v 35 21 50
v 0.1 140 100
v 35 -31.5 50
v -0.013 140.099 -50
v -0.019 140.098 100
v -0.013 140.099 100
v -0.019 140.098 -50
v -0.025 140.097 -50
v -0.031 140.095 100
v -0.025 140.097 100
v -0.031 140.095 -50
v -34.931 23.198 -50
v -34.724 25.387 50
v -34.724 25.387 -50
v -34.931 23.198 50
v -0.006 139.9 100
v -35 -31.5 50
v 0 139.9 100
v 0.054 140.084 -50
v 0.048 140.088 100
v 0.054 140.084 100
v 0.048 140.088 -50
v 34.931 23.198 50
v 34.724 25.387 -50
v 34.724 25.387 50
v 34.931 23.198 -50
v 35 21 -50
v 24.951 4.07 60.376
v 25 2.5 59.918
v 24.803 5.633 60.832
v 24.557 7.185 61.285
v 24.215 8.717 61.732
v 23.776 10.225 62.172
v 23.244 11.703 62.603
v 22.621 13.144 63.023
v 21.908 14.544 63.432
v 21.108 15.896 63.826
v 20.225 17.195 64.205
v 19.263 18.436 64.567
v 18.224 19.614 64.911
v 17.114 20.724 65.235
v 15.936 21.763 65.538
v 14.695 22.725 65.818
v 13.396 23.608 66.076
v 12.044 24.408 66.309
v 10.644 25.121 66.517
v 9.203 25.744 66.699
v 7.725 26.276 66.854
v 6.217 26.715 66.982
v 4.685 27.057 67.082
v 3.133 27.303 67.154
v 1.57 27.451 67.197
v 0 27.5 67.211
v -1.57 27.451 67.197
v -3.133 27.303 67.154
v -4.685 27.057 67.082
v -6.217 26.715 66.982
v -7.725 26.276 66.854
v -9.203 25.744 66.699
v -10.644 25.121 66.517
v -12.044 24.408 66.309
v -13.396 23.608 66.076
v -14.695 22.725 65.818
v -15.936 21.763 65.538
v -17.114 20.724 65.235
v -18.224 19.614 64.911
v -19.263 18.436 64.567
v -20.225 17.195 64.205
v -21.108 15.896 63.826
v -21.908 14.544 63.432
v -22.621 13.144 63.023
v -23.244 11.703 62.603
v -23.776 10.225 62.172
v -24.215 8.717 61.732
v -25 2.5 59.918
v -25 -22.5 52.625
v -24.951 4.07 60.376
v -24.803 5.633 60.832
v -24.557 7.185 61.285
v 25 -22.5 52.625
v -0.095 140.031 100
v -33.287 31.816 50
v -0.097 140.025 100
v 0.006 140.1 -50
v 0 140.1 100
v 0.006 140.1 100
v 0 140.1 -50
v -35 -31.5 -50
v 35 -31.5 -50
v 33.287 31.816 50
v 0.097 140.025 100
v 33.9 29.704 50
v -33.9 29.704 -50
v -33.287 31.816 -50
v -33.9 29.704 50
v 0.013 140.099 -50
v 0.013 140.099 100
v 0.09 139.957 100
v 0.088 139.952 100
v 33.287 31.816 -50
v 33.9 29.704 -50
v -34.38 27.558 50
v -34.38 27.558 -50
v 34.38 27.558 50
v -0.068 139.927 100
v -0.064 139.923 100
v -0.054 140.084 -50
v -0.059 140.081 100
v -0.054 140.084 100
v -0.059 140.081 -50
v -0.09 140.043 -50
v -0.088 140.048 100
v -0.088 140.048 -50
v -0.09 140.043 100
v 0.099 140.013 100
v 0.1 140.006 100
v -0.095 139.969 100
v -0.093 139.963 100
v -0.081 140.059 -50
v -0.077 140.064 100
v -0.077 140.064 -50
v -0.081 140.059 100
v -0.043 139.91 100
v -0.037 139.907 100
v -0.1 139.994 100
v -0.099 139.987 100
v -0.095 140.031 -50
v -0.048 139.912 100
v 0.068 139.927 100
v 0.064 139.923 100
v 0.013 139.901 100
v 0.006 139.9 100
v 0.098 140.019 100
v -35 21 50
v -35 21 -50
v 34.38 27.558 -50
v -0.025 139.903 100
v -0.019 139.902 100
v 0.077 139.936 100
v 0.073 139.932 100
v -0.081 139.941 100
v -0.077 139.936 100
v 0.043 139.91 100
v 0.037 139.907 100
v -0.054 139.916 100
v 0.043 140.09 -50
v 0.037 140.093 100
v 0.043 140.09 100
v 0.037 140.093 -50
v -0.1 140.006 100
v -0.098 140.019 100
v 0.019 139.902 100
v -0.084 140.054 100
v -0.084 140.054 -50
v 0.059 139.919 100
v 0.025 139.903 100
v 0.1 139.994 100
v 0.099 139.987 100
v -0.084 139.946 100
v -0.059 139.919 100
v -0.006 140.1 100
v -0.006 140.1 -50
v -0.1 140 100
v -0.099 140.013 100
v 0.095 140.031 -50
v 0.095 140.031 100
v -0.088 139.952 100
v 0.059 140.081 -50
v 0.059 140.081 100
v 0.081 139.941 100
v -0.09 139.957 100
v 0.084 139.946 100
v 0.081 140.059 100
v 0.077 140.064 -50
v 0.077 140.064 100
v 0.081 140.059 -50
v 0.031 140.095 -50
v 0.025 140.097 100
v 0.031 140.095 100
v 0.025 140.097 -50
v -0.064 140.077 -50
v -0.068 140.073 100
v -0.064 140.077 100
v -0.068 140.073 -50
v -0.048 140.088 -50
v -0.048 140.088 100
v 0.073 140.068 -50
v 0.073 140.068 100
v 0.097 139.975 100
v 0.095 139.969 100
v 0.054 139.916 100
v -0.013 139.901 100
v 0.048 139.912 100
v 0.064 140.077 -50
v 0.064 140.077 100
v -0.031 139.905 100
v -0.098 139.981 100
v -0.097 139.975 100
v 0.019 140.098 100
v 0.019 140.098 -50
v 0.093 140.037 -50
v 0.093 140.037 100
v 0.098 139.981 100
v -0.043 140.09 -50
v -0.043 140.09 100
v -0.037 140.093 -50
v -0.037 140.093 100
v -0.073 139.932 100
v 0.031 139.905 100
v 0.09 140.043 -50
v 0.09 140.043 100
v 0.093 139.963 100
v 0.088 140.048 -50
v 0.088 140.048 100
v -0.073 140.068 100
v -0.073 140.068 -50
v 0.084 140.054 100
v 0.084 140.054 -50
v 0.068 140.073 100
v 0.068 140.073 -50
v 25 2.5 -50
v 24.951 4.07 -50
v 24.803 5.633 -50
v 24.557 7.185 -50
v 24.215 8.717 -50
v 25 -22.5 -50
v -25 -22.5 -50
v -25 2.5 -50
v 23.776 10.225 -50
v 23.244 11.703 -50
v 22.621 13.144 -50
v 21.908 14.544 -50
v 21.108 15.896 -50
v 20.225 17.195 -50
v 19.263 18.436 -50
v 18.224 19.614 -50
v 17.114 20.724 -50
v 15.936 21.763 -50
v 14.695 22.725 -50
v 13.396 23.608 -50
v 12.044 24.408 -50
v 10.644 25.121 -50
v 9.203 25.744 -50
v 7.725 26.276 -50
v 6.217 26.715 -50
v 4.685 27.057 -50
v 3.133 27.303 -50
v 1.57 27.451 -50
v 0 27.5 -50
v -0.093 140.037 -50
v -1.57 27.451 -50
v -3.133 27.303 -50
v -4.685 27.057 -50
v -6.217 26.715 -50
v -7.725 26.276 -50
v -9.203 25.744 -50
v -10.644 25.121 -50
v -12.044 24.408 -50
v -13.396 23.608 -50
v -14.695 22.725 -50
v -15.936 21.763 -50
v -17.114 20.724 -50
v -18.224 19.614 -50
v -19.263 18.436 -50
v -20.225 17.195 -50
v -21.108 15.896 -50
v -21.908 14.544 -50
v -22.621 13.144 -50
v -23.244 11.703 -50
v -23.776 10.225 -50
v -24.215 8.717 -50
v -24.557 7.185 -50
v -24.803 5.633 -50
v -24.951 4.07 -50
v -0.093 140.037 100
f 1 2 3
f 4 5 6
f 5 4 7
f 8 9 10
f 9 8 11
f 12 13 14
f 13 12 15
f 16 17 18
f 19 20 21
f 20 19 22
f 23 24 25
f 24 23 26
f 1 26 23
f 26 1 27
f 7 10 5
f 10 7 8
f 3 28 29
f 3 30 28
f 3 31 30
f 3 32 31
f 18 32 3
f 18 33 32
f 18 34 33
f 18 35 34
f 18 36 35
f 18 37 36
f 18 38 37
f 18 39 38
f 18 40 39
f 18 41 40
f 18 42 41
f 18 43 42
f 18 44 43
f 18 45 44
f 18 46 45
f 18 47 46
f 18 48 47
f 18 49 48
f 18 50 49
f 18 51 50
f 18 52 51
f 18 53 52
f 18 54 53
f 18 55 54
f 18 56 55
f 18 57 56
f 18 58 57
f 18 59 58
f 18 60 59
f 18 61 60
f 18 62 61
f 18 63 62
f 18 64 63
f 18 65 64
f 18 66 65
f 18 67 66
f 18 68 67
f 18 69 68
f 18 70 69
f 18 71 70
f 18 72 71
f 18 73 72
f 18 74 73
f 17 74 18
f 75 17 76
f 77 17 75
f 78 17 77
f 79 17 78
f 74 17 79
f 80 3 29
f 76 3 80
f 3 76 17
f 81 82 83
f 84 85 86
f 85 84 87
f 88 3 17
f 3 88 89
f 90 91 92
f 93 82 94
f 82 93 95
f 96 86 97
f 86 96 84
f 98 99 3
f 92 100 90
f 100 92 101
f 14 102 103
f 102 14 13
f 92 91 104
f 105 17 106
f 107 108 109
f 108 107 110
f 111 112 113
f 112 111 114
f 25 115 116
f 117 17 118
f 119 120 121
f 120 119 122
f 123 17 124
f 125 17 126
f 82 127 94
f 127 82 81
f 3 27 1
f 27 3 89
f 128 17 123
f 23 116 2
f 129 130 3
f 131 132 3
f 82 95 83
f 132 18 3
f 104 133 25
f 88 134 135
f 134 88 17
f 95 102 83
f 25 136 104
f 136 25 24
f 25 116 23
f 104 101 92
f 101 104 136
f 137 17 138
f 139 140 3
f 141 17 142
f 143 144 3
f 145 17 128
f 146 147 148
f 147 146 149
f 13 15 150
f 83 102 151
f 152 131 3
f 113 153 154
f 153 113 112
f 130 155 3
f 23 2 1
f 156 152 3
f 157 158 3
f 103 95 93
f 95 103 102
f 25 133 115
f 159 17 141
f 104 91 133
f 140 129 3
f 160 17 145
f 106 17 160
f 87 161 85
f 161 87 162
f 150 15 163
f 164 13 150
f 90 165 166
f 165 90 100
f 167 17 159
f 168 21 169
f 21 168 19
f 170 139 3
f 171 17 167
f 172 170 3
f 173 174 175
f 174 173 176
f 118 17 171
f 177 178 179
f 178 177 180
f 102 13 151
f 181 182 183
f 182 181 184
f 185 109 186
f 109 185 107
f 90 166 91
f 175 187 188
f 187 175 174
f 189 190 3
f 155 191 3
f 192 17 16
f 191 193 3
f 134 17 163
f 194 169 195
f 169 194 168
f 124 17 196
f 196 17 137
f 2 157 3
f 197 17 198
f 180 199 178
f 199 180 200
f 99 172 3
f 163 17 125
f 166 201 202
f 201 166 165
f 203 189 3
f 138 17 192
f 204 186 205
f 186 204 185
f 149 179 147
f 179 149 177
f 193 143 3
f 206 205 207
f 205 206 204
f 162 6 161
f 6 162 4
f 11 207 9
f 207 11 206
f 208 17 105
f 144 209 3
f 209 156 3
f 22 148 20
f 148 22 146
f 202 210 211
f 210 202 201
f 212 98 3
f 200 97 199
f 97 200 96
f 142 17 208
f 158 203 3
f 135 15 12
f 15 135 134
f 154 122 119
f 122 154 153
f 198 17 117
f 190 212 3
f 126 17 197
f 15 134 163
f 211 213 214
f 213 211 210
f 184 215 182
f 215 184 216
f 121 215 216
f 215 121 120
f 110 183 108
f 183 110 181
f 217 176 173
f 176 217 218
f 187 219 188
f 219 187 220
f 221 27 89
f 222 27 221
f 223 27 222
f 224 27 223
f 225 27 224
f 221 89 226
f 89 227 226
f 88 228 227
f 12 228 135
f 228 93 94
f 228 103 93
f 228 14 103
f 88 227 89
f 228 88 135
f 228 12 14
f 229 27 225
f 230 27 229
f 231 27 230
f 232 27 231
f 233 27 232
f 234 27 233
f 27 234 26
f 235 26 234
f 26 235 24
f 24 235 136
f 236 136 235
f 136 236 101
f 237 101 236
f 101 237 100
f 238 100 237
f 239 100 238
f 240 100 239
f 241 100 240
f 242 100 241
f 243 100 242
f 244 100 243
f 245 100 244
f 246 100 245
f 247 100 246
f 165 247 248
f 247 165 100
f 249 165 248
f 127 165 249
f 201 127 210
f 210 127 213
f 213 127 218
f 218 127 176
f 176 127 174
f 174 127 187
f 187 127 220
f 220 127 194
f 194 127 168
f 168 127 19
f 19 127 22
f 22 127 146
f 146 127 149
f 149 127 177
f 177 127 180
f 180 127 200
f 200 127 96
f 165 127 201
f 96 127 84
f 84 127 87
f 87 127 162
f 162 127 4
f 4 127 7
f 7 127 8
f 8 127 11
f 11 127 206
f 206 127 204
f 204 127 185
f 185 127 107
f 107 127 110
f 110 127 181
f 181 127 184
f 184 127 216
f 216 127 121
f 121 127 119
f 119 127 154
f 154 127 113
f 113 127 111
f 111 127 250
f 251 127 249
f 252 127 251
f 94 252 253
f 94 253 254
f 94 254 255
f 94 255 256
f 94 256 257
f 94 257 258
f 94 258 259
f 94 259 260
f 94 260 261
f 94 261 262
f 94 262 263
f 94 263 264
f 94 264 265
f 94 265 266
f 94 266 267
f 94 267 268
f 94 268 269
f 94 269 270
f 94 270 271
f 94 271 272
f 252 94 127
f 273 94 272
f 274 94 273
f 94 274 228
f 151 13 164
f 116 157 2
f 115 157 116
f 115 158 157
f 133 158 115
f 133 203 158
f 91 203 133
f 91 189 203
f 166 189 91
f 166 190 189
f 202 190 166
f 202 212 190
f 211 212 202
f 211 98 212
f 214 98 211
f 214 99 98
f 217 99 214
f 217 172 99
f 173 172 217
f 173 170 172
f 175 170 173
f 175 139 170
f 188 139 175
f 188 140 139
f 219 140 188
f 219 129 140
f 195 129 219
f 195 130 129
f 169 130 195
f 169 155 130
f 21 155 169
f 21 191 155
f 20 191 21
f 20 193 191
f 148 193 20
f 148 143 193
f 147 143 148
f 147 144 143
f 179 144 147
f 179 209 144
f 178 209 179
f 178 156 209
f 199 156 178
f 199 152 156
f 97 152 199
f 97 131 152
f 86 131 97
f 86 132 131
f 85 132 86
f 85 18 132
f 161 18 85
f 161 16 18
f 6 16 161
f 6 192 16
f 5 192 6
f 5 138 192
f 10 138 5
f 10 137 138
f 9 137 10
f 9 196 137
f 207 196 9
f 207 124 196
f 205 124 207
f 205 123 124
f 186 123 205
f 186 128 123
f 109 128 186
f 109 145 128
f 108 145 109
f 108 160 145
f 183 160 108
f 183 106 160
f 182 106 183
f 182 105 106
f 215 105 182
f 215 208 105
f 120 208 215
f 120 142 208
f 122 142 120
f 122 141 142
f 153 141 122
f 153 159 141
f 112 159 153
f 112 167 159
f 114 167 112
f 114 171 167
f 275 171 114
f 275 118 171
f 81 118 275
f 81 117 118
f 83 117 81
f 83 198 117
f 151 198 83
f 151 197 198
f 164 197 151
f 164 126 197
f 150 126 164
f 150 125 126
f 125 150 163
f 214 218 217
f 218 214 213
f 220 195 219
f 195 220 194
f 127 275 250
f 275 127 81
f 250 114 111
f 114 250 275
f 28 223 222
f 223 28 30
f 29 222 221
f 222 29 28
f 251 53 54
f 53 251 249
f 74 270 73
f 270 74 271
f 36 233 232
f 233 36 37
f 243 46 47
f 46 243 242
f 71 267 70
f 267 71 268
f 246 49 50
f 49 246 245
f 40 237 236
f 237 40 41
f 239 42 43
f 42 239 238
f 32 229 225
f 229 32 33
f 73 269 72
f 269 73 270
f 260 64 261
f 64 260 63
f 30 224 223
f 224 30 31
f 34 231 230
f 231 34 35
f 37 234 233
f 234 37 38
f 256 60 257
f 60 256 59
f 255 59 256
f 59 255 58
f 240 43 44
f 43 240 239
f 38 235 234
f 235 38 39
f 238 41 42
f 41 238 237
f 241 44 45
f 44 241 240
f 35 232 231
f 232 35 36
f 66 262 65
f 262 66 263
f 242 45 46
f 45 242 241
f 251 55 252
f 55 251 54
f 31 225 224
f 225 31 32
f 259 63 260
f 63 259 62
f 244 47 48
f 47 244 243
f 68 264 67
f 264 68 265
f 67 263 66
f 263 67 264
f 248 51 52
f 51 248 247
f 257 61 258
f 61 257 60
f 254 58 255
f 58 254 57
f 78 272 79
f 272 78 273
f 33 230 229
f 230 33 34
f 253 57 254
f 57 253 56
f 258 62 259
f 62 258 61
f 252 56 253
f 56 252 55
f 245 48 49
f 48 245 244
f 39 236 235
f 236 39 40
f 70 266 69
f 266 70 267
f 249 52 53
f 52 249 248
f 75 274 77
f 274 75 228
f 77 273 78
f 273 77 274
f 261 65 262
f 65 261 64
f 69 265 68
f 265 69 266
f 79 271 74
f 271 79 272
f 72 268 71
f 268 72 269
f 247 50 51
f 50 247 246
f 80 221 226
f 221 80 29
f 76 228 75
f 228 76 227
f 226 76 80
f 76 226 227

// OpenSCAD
// Customizable simple axe head

//Customizer Variables

//axe head back
r= 70; //[1:200]

//resolution
n=100; //[1:200]

//axe head height
h=100; //[1:500]

// handle hole radius
x=25; // 

//scale
s=140; //

// blade lip
l=50;//

// roundness
a=20;//

module chuck(){
	union(){
translate([0,-0.1*r,0])cube([r,0.7*r,h], center = true);
translate([0,0.6*r/2,0])cylinder(h = h, r1 = r/2, r2 = r/2, center = true, $fn=n);
}
}

module chunk(){
hull(){
chuck();
translate([0,s,l/2])cylinder(h = h+l, r1 = 0.1, r2 = 0.1, center = true, $fn=n);
				}
}

module axehead(){
	difference(){
	chunk();	
	translate([0,x*.1,0])cylinder(h = h+l+1, r1 = x, r2 = x, center = true, $fn=n);
	translate([-x,-x*.9,-h/2-1])cube([2*x, x,h+l+1,]);
	}
					}
axehead();
